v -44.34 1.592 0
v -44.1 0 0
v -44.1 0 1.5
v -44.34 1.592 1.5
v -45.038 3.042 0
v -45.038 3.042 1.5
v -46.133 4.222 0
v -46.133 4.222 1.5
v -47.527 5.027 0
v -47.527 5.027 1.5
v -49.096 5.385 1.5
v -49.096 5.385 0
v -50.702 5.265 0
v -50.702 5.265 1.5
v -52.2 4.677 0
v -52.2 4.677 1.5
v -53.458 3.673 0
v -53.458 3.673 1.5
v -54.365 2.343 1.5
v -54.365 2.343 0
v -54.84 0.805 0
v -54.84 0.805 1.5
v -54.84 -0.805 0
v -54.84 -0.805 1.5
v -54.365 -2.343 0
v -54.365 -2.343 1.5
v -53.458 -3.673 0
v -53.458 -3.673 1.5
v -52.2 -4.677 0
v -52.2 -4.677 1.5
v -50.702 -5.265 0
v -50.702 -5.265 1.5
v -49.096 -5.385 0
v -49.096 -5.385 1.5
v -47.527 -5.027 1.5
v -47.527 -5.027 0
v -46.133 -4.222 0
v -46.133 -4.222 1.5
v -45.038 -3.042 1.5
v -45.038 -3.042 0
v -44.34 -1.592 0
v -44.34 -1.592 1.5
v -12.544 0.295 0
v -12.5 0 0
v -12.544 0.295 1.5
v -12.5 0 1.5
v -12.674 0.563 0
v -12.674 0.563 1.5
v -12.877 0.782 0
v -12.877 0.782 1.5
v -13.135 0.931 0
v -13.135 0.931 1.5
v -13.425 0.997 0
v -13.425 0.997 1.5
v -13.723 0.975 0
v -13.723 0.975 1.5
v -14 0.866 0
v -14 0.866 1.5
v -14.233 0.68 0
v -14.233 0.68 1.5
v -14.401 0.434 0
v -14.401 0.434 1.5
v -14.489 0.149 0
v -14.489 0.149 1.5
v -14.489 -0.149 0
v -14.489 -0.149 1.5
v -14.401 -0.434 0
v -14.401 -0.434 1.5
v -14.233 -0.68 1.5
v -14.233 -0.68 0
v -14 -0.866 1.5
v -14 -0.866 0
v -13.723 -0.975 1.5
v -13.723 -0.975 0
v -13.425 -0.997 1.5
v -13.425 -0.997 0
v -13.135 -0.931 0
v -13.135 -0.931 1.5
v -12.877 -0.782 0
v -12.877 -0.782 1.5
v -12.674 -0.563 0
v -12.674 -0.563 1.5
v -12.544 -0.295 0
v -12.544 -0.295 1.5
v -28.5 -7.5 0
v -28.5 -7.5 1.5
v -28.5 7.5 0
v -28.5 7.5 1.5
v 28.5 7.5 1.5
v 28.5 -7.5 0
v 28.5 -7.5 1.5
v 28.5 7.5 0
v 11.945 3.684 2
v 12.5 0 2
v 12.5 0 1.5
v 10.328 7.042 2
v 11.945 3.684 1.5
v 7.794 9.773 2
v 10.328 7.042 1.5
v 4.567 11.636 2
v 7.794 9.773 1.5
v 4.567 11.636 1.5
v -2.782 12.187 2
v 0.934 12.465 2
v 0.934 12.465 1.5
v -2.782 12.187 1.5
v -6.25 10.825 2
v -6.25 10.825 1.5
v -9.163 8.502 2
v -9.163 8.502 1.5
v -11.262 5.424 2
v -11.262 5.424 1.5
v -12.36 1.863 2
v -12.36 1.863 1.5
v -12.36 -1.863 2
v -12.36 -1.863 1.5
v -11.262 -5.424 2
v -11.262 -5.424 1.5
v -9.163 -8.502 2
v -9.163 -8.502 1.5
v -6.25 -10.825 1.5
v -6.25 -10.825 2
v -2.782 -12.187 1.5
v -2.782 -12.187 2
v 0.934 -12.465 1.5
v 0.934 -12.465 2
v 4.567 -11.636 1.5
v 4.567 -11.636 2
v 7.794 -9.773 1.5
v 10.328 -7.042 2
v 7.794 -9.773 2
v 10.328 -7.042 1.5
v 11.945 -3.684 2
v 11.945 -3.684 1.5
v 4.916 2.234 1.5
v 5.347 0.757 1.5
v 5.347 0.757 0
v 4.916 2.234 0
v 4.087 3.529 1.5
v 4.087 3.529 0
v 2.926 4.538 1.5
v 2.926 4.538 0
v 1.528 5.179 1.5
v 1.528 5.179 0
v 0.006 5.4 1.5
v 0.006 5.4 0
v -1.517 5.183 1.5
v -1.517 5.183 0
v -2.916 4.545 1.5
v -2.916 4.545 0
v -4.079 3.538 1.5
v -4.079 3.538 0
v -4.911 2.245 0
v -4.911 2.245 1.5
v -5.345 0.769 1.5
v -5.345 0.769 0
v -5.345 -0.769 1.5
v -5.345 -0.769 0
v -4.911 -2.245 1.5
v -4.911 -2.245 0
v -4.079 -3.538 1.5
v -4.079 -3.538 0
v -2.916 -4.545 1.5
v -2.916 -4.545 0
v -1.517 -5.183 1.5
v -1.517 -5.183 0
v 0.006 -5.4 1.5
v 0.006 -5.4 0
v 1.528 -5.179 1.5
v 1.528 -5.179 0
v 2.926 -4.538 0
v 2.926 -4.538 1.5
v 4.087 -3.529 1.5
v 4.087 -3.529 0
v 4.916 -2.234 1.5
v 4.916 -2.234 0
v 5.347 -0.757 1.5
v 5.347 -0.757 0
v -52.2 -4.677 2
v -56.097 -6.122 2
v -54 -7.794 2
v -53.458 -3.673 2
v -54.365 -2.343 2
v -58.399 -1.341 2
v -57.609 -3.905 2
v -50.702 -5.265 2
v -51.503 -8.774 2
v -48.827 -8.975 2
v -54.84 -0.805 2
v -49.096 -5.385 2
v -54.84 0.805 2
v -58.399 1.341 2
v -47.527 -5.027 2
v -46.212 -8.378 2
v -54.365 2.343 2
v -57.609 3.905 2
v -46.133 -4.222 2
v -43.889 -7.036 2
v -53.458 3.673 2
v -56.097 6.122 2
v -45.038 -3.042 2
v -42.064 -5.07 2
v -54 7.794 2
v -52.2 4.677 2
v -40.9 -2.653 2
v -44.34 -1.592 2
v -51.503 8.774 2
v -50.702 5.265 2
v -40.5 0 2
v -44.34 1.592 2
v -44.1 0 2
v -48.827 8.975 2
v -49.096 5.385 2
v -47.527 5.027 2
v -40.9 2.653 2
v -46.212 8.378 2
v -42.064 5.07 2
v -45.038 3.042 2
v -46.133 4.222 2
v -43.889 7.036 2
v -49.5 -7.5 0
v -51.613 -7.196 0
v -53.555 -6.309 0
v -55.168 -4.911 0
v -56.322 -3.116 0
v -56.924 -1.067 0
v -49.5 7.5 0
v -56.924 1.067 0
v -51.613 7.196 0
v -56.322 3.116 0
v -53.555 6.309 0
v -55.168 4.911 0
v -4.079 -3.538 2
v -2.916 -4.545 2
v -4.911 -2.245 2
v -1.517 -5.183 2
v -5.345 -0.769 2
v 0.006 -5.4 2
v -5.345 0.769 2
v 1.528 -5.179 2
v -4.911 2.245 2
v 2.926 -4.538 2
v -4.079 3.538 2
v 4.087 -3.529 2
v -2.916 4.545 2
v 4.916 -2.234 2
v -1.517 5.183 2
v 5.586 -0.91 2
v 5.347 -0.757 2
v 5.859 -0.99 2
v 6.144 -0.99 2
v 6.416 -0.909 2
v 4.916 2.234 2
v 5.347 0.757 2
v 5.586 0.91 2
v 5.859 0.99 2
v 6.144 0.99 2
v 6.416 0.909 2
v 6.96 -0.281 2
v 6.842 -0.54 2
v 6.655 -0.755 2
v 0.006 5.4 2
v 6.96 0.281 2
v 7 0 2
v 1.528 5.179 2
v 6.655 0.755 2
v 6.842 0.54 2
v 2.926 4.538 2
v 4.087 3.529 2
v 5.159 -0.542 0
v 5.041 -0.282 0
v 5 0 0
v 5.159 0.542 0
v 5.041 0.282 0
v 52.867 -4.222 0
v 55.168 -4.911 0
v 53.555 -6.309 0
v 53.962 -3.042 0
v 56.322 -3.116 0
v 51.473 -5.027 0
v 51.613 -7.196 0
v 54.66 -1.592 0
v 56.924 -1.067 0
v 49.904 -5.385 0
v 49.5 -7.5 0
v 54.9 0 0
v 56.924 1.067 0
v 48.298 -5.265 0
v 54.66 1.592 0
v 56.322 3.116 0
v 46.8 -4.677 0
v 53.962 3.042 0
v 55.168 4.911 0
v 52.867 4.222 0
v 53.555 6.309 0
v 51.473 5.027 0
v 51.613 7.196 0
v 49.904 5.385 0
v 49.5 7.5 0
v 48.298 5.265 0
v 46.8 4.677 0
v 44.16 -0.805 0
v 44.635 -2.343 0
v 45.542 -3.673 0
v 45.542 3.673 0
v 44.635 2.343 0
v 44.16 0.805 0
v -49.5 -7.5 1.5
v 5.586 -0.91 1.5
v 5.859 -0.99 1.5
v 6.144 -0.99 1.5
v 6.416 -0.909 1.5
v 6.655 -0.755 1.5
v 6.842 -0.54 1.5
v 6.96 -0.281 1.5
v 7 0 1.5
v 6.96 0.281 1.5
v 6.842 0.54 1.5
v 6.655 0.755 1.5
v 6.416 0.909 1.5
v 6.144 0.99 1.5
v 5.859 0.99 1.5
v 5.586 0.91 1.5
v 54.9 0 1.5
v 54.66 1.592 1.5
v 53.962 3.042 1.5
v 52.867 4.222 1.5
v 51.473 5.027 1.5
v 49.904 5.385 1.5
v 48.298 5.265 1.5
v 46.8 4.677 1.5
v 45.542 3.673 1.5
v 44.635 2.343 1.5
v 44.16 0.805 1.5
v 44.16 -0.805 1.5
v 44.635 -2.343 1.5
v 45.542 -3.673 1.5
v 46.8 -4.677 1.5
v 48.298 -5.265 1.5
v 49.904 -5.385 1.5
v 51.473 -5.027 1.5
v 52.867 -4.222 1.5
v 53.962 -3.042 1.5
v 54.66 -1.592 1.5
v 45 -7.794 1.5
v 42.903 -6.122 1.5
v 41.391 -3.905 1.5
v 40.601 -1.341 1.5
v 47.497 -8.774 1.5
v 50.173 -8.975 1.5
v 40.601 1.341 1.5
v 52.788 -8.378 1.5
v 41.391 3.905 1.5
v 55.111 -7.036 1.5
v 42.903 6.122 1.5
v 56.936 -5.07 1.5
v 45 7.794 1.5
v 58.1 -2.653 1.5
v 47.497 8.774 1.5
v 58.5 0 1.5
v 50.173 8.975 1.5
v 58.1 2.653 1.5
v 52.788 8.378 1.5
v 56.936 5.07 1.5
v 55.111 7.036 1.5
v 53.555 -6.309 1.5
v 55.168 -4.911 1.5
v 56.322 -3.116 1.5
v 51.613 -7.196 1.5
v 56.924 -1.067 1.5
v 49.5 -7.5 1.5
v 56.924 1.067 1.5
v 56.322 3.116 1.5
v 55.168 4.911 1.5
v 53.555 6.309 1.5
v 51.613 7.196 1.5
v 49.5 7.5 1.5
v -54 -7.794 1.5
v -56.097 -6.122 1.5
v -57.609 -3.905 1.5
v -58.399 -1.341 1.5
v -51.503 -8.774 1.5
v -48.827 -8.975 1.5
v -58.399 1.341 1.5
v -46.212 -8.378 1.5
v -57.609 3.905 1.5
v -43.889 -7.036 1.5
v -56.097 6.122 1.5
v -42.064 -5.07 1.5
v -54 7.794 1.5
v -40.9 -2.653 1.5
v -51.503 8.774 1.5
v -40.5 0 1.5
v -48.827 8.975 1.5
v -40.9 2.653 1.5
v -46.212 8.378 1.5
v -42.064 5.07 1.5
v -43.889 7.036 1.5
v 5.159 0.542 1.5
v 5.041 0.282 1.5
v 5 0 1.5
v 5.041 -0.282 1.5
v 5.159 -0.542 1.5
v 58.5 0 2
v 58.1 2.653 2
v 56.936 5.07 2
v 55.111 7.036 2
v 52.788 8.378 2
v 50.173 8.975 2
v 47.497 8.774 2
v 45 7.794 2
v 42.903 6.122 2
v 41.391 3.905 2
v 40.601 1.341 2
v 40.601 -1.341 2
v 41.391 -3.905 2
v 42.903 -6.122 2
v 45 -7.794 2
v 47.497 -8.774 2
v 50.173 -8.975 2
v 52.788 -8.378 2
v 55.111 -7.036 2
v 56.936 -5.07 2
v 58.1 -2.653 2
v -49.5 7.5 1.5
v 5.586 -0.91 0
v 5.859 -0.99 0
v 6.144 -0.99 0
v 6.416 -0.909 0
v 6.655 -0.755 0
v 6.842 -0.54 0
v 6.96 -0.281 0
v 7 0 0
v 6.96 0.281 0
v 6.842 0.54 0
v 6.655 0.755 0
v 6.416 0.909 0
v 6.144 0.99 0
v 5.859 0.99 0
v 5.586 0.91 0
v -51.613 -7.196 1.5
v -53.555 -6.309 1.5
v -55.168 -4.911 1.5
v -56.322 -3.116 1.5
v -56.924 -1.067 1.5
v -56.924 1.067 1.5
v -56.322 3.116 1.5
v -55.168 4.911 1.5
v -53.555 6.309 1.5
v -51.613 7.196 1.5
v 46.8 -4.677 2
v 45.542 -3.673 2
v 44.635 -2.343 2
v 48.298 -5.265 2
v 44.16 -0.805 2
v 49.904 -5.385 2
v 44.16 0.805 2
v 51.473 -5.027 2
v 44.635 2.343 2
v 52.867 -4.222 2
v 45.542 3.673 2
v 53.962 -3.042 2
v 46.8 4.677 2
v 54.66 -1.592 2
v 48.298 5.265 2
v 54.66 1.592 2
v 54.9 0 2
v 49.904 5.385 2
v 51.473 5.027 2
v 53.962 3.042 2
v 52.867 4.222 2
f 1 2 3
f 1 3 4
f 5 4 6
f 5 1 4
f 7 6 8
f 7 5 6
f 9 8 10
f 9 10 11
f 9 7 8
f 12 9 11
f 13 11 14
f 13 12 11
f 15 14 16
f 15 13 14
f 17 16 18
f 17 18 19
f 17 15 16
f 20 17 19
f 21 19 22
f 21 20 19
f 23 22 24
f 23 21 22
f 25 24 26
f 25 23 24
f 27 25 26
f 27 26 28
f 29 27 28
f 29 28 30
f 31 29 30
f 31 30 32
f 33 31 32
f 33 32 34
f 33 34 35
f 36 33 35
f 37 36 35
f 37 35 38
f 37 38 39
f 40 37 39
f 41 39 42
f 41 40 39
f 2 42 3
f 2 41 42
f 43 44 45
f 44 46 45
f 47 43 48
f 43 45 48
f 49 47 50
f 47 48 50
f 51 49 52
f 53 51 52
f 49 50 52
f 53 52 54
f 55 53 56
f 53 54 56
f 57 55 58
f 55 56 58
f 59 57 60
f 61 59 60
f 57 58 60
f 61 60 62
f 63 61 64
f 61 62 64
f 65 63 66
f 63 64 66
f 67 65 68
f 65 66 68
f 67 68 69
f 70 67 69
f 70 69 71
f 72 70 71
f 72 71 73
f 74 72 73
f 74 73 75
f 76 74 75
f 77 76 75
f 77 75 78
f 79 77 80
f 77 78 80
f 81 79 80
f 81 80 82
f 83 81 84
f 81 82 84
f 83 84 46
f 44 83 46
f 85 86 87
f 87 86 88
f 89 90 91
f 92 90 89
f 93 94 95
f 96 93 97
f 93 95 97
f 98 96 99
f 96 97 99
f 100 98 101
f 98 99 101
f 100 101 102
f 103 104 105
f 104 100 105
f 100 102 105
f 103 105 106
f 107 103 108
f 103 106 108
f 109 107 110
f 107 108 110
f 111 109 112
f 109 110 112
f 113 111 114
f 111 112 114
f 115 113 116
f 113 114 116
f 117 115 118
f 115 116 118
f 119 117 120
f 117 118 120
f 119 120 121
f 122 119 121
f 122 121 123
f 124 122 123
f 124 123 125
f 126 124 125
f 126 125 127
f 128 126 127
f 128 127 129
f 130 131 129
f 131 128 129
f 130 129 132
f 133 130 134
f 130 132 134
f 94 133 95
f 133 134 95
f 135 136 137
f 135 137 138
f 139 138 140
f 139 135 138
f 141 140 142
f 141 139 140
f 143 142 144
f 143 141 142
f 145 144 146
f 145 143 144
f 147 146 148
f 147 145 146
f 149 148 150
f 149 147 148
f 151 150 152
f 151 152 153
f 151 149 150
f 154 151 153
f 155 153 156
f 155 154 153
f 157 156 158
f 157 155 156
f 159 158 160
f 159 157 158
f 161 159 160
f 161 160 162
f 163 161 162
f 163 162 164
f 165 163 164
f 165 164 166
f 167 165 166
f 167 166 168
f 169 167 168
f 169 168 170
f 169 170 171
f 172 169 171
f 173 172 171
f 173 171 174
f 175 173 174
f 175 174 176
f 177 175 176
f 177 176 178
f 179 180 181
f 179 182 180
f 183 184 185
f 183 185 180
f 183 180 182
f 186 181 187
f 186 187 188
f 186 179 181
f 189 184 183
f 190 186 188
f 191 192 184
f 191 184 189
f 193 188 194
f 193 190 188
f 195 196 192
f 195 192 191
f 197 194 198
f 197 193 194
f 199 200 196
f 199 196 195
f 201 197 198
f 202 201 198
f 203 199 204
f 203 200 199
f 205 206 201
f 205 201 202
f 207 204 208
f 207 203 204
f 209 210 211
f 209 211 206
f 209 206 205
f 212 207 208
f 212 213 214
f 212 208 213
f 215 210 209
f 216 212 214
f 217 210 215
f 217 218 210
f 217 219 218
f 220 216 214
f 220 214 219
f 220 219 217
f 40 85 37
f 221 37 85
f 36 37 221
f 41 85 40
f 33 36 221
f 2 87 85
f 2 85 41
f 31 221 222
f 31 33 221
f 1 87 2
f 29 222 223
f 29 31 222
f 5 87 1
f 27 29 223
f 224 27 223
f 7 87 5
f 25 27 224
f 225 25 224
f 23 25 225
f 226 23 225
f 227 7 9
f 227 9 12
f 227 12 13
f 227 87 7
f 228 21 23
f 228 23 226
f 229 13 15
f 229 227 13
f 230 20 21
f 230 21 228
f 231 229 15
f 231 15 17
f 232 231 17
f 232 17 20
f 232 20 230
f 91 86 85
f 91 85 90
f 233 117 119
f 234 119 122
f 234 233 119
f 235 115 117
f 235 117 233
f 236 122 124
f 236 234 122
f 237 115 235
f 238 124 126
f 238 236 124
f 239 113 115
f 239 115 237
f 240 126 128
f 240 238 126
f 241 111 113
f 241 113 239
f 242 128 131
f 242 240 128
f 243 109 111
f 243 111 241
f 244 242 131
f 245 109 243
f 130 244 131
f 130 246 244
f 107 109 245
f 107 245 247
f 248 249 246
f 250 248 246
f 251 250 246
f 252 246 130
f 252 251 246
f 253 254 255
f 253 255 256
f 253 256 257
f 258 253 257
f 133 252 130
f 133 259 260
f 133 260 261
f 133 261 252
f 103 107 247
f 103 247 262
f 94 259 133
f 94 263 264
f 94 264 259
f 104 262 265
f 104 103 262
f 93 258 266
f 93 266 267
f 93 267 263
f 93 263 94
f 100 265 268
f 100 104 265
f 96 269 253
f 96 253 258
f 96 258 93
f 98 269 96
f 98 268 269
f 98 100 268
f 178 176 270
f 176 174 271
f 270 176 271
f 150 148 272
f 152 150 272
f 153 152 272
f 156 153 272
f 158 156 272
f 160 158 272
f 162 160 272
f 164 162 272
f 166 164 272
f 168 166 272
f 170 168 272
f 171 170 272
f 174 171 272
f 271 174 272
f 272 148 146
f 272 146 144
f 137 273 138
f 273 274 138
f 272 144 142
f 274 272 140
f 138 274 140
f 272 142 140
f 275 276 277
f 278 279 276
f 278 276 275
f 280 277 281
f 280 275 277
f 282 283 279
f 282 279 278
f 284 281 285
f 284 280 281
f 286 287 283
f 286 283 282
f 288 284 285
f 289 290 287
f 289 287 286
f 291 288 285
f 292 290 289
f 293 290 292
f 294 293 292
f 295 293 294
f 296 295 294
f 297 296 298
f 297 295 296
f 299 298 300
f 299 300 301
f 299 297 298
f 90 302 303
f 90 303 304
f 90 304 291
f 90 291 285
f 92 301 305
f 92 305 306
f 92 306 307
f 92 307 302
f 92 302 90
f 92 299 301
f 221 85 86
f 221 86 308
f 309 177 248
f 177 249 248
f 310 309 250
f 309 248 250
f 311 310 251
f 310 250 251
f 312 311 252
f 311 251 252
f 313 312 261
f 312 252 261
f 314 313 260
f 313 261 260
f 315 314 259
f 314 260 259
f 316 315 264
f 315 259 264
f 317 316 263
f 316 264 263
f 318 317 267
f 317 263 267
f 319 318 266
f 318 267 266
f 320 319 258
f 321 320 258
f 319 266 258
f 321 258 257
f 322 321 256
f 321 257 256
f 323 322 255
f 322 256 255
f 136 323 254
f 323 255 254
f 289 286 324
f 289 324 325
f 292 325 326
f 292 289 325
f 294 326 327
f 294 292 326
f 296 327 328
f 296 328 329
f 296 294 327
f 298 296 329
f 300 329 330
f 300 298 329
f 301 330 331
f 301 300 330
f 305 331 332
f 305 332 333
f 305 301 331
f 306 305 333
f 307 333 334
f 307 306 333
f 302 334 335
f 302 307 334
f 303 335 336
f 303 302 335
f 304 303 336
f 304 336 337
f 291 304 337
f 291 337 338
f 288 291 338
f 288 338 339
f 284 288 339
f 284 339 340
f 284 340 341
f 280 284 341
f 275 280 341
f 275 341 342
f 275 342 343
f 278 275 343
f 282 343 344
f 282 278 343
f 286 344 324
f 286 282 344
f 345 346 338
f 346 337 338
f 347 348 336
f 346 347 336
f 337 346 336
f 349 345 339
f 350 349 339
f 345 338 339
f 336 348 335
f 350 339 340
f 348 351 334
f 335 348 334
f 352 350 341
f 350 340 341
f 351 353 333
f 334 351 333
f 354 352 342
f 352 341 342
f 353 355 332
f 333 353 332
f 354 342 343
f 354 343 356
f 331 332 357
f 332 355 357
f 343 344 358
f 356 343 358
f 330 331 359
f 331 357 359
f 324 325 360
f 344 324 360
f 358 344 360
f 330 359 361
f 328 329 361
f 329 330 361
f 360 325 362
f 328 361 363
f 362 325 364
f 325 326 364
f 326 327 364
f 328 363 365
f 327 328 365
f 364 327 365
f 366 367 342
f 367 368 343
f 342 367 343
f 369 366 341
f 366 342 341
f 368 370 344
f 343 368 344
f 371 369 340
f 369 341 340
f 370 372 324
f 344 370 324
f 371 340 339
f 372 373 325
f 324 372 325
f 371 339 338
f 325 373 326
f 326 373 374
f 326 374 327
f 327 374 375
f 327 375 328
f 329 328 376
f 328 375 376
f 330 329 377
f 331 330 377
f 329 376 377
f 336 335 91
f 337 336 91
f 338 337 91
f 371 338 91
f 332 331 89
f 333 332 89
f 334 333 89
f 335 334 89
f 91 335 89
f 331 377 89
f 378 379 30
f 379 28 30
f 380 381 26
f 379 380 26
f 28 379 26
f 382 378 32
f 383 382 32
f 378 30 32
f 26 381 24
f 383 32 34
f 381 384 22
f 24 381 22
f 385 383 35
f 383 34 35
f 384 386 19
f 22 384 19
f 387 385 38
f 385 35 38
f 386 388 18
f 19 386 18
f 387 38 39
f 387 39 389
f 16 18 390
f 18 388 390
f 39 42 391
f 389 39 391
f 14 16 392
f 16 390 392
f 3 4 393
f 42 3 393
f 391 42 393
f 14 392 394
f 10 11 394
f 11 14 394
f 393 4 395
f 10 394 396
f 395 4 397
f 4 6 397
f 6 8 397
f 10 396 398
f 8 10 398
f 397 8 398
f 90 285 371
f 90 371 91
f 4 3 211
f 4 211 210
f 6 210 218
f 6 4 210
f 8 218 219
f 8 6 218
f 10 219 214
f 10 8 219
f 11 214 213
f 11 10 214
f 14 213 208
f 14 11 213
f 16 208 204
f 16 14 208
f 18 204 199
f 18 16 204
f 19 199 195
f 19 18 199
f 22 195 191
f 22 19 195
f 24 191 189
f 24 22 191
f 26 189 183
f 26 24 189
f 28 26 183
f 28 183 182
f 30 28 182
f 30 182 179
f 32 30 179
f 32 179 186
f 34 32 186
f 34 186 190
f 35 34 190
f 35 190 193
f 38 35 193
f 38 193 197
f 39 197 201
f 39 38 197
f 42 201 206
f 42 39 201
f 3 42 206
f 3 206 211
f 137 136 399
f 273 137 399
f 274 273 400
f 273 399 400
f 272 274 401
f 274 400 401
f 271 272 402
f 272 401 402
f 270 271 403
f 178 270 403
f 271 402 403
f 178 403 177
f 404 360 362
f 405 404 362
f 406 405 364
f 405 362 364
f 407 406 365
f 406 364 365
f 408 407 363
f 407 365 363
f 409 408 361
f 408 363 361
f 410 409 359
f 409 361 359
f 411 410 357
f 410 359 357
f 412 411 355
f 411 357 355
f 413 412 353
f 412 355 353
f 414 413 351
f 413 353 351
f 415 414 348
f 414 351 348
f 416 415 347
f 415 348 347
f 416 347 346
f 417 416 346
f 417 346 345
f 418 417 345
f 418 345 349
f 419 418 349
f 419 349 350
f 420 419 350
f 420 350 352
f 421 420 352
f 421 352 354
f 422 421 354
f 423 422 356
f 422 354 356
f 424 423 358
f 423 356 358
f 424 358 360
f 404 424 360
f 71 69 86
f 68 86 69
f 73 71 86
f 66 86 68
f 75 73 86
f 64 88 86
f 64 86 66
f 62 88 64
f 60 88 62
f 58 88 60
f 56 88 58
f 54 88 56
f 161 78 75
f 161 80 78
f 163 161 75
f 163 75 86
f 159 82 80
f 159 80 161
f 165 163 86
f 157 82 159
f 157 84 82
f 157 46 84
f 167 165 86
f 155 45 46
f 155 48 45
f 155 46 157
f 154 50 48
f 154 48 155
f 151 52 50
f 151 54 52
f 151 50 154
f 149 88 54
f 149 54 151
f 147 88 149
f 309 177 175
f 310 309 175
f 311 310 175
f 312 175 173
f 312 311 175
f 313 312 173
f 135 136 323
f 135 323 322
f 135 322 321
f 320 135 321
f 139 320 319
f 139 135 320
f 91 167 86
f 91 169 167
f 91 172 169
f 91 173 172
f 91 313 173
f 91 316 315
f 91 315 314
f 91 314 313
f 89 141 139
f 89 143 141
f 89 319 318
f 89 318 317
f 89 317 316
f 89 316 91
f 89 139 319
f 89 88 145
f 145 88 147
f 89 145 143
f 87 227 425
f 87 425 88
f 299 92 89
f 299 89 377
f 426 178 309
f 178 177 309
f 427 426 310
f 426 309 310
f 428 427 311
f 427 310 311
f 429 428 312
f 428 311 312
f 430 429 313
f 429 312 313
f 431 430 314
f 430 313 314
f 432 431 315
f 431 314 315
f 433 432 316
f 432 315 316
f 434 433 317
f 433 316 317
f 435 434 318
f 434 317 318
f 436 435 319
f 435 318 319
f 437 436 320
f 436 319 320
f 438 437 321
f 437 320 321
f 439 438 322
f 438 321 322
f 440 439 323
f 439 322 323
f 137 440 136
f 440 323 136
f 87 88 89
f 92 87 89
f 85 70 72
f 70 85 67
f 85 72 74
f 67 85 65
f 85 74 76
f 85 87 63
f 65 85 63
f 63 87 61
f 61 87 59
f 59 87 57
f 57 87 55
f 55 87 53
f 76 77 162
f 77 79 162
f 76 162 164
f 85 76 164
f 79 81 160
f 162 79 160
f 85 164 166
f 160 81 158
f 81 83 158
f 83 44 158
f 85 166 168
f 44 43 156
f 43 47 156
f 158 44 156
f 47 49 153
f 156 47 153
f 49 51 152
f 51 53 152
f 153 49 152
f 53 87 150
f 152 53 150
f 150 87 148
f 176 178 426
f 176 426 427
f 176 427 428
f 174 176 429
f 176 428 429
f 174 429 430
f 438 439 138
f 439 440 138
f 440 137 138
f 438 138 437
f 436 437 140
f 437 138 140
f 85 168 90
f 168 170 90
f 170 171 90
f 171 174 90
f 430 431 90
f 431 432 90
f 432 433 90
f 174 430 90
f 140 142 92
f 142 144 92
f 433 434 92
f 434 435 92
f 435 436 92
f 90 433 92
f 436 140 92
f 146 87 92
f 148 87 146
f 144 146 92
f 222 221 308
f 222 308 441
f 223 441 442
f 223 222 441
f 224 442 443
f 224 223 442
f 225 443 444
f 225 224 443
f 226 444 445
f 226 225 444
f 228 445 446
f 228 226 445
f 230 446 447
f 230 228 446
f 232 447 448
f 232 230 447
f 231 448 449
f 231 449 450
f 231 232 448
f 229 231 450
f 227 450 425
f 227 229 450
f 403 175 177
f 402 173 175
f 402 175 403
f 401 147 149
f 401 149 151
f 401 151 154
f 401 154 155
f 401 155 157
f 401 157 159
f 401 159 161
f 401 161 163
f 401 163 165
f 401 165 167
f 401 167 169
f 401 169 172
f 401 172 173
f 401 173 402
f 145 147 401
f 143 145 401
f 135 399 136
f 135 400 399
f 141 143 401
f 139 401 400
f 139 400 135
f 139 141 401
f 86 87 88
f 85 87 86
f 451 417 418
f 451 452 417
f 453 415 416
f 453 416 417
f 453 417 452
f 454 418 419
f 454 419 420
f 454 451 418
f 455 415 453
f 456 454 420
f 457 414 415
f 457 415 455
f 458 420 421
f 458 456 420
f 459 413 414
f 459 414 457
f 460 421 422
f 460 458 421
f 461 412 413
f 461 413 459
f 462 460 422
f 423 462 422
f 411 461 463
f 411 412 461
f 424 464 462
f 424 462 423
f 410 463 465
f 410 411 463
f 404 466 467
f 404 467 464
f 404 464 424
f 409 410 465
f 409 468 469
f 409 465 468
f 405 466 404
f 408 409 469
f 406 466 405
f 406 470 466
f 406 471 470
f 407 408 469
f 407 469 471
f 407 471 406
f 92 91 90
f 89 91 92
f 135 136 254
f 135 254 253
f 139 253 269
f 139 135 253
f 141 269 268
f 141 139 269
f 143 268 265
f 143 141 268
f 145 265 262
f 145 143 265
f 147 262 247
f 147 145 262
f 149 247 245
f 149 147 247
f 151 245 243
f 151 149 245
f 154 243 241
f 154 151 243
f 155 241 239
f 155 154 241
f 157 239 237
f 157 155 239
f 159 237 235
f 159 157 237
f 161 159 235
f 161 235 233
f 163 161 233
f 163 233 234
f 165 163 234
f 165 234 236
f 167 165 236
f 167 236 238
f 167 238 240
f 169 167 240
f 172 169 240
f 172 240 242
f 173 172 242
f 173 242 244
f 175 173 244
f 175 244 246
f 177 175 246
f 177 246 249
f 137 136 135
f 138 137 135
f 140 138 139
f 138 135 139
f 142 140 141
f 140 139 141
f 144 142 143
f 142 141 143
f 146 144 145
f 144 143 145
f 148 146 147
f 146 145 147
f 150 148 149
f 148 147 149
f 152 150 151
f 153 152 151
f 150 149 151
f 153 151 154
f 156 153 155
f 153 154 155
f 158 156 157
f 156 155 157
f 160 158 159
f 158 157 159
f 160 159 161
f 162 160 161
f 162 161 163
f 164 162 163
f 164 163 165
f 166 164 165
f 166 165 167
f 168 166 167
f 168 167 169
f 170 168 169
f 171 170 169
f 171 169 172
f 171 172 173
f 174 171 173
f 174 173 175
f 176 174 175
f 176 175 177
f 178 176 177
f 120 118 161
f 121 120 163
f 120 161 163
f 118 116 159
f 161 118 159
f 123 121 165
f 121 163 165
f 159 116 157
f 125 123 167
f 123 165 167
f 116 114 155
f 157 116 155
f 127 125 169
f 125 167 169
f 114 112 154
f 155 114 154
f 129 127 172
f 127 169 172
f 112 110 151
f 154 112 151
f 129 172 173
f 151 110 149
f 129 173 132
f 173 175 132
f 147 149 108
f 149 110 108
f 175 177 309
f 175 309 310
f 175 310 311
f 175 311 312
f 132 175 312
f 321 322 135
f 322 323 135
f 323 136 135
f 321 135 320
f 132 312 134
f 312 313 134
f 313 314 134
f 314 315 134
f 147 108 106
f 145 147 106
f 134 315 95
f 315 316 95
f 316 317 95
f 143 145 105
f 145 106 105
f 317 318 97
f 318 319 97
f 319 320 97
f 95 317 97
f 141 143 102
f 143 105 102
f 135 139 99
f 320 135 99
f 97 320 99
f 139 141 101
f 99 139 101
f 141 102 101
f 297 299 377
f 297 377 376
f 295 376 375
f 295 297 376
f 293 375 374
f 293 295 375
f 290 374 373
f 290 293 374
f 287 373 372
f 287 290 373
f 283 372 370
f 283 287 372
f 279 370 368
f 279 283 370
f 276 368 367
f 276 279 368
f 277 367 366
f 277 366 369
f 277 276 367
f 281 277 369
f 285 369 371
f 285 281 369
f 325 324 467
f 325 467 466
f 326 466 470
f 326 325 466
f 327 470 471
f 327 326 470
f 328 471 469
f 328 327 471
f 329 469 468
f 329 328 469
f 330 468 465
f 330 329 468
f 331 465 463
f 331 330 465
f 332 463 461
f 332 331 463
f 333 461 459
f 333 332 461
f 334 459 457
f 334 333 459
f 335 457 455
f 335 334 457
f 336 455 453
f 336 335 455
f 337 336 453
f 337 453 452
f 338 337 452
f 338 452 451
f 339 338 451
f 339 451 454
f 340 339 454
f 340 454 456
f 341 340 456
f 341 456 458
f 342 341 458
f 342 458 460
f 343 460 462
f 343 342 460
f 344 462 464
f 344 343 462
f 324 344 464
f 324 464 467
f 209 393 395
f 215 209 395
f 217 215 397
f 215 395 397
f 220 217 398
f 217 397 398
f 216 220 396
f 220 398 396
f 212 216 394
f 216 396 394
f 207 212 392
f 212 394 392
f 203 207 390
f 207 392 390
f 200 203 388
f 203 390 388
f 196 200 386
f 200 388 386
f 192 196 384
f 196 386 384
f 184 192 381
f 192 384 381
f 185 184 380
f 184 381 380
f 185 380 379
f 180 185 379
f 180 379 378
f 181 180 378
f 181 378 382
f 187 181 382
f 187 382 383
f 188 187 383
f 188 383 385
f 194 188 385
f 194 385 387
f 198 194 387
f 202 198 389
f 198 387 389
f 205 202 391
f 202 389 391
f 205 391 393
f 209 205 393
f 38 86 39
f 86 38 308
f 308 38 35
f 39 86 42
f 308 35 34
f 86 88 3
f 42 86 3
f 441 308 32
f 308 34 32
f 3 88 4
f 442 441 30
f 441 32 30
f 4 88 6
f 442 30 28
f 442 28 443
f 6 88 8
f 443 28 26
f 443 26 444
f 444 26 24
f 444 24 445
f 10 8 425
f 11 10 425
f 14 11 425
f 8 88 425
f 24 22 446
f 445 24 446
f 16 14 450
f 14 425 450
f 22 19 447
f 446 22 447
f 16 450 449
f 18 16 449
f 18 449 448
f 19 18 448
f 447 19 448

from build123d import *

# Parameters (mm, degrees)
SKETCH1_R               = 5.4
BOSS_EXTRUDE1_DEPTH     = 1.5
BOSS_EXTRUDE1_2_DEPTH   = 1.5
SKETCH2_W               = 57
SKETCH2_H               = 15
SKETCH2_R               = 5.4
BOSS_EXTRUDE2_DEPTH     = 1.5
SKETCH3_R               = 12.5
SKETCH3_R_2             = 5.4
BOSS_EXTRUDE3_DEPTH     = 0.5
SKETCH3_R_3             = 9
BOSS_EXTRUDE3_2_DEPTH   = 0.5
BOSS_EXTRUDE3_3_DEPTH   = 0.5
SKETCH4_R               = 5.4
BOSS_EXTRUDE4_DEPTH     = 1.5
SKETCH5_R               = 1
CUT_EXTRUDE1_DEPTH      = 1.5
CUT_EXTRUDE1_DEPTH_BACK = 2.5


with BuildPart() as part:
    # Sketch1 → Boss-Extrude1 (new body)
    with BuildSketch(Plane.XY):
        with BuildLine():
            ThreePointArc((-49.5, -7.5), (-57, 0), (-49.5, 7.5))
            Line((-49.5, 7.5), (-28.5, 7.5))
            Line((-28.5, 7.5), (-28.5, -7.5))
            Line((-28.5, -7.5), (-49.5, -7.5))
        make_face()
        with Locations((-49.5, 0)):
            Circle(SKETCH1_R, mode=Mode.SUBTRACT)
    extrude(amount=BOSS_EXTRUDE1_DEPTH)


with BuildPart() as body_2:
    # Sketch1 → Boss-Extrude1 2 (new body)
    with BuildSketch(Plane.XY):
        with BuildLine():
            Line((49.5, -7.5), (28.5, -7.5))
            Line((28.5, -7.5), (28.5, 7.5))
            Line((28.5, 7.5), (49.5, 7.5))
            ThreePointArc((49.5, 7.5), (57, 0), (49.5, -7.5))
        make_face()
        with Locations((49.5, 0)):
            Circle(SKETCH1_R, mode=Mode.SUBTRACT)
    extrude(amount=BOSS_EXTRUDE1_2_DEPTH)


with BuildPart() as body_3:
    # Sketch2 → Boss-Extrude2 (new body)
    with BuildSketch(Plane.XY.offset(1.5)):
        Rectangle(SKETCH2_W, SKETCH2_H)
        Circle(SKETCH2_R, mode=Mode.SUBTRACT)
    extrude(amount=-BOSS_EXTRUDE2_DEPTH)


with BuildPart() as body_4:
    # Sketch3 → Boss-Extrude3 (new body)
    with BuildSketch(Plane.XY.offset(1.5)):
        Circle(SKETCH3_R)
        Circle(SKETCH3_R_2, mode=Mode.SUBTRACT)
    extrude(amount=BOSS_EXTRUDE3_DEPTH)


with BuildPart() as body_5:
    # Sketch3 → Boss-Extrude3 2 (new body)
    with BuildSketch(Plane.XY.offset(1.5)):
        with Locations((49.5, 0)):
            Circle(SKETCH3_R_3)
        with Locations((49.5, 0)):
            Circle(SKETCH3_R_2, mode=Mode.SUBTRACT)
    extrude(amount=BOSS_EXTRUDE3_2_DEPTH)


with BuildPart() as body_6:
    # Sketch3 → Boss-Extrude3 3 (new body)
    with BuildSketch(Plane.XY.offset(1.5)):
        with Locations((-49.5, 0)):
            Circle(SKETCH3_R_3)
        with Locations((-49.5, 0)):
            Circle(SKETCH3_R_2, mode=Mode.SUBTRACT)
    extrude(amount=BOSS_EXTRUDE3_3_DEPTH)


with BuildPart() as body_7:
    # Sketch4 → Boss-Extrude4 (new body)
    with BuildSketch(Plane.XY.offset(1.5)):
        Circle(SKETCH4_R)
    extrude(amount=-BOSS_EXTRUDE4_DEPTH)


with BuildPart() as cut_extrude1_tool:
    # Sketch5 → Cut-Extrude1 (new body, two sides)
    with BuildSketch(Plane.XY.offset(1.5)) as cut_extrude1_sk:
        with Locations((-13.5, 0)):
            Circle(SKETCH5_R)
        with Locations((6, 0)):
            Circle(SKETCH5_R)
    extrude(amount=CUT_EXTRUDE1_DEPTH)
    extrude(cut_extrude1_sk.sketch, amount=-CUT_EXTRUDE1_DEPTH_BACK)


with BuildPart() as body_3_1:
    add(body_3.part)

    # Cut-Extrude1: cut by cut_extrude1_tool
    add(cut_extrude1_tool.part, mode=Mode.SUBTRACT)


with BuildPart() as body_4_1:
    add(body_4.part)

    # Cut-Extrude1: cut by cut_extrude1_tool
    add(cut_extrude1_tool.part, mode=Mode.SUBTRACT)


with BuildPart() as body_7_1:
    add(body_7.part)

    # Cut-Extrude1: cut by cut_extrude1_tool
    add(cut_extrude1_tool.part, mode=Mode.SUBTRACT)


solid = Compound([part.part, body_2.part, body_5.part, body_6.part, body_3_1.part, body_4_1.part, body_7_1.part])
